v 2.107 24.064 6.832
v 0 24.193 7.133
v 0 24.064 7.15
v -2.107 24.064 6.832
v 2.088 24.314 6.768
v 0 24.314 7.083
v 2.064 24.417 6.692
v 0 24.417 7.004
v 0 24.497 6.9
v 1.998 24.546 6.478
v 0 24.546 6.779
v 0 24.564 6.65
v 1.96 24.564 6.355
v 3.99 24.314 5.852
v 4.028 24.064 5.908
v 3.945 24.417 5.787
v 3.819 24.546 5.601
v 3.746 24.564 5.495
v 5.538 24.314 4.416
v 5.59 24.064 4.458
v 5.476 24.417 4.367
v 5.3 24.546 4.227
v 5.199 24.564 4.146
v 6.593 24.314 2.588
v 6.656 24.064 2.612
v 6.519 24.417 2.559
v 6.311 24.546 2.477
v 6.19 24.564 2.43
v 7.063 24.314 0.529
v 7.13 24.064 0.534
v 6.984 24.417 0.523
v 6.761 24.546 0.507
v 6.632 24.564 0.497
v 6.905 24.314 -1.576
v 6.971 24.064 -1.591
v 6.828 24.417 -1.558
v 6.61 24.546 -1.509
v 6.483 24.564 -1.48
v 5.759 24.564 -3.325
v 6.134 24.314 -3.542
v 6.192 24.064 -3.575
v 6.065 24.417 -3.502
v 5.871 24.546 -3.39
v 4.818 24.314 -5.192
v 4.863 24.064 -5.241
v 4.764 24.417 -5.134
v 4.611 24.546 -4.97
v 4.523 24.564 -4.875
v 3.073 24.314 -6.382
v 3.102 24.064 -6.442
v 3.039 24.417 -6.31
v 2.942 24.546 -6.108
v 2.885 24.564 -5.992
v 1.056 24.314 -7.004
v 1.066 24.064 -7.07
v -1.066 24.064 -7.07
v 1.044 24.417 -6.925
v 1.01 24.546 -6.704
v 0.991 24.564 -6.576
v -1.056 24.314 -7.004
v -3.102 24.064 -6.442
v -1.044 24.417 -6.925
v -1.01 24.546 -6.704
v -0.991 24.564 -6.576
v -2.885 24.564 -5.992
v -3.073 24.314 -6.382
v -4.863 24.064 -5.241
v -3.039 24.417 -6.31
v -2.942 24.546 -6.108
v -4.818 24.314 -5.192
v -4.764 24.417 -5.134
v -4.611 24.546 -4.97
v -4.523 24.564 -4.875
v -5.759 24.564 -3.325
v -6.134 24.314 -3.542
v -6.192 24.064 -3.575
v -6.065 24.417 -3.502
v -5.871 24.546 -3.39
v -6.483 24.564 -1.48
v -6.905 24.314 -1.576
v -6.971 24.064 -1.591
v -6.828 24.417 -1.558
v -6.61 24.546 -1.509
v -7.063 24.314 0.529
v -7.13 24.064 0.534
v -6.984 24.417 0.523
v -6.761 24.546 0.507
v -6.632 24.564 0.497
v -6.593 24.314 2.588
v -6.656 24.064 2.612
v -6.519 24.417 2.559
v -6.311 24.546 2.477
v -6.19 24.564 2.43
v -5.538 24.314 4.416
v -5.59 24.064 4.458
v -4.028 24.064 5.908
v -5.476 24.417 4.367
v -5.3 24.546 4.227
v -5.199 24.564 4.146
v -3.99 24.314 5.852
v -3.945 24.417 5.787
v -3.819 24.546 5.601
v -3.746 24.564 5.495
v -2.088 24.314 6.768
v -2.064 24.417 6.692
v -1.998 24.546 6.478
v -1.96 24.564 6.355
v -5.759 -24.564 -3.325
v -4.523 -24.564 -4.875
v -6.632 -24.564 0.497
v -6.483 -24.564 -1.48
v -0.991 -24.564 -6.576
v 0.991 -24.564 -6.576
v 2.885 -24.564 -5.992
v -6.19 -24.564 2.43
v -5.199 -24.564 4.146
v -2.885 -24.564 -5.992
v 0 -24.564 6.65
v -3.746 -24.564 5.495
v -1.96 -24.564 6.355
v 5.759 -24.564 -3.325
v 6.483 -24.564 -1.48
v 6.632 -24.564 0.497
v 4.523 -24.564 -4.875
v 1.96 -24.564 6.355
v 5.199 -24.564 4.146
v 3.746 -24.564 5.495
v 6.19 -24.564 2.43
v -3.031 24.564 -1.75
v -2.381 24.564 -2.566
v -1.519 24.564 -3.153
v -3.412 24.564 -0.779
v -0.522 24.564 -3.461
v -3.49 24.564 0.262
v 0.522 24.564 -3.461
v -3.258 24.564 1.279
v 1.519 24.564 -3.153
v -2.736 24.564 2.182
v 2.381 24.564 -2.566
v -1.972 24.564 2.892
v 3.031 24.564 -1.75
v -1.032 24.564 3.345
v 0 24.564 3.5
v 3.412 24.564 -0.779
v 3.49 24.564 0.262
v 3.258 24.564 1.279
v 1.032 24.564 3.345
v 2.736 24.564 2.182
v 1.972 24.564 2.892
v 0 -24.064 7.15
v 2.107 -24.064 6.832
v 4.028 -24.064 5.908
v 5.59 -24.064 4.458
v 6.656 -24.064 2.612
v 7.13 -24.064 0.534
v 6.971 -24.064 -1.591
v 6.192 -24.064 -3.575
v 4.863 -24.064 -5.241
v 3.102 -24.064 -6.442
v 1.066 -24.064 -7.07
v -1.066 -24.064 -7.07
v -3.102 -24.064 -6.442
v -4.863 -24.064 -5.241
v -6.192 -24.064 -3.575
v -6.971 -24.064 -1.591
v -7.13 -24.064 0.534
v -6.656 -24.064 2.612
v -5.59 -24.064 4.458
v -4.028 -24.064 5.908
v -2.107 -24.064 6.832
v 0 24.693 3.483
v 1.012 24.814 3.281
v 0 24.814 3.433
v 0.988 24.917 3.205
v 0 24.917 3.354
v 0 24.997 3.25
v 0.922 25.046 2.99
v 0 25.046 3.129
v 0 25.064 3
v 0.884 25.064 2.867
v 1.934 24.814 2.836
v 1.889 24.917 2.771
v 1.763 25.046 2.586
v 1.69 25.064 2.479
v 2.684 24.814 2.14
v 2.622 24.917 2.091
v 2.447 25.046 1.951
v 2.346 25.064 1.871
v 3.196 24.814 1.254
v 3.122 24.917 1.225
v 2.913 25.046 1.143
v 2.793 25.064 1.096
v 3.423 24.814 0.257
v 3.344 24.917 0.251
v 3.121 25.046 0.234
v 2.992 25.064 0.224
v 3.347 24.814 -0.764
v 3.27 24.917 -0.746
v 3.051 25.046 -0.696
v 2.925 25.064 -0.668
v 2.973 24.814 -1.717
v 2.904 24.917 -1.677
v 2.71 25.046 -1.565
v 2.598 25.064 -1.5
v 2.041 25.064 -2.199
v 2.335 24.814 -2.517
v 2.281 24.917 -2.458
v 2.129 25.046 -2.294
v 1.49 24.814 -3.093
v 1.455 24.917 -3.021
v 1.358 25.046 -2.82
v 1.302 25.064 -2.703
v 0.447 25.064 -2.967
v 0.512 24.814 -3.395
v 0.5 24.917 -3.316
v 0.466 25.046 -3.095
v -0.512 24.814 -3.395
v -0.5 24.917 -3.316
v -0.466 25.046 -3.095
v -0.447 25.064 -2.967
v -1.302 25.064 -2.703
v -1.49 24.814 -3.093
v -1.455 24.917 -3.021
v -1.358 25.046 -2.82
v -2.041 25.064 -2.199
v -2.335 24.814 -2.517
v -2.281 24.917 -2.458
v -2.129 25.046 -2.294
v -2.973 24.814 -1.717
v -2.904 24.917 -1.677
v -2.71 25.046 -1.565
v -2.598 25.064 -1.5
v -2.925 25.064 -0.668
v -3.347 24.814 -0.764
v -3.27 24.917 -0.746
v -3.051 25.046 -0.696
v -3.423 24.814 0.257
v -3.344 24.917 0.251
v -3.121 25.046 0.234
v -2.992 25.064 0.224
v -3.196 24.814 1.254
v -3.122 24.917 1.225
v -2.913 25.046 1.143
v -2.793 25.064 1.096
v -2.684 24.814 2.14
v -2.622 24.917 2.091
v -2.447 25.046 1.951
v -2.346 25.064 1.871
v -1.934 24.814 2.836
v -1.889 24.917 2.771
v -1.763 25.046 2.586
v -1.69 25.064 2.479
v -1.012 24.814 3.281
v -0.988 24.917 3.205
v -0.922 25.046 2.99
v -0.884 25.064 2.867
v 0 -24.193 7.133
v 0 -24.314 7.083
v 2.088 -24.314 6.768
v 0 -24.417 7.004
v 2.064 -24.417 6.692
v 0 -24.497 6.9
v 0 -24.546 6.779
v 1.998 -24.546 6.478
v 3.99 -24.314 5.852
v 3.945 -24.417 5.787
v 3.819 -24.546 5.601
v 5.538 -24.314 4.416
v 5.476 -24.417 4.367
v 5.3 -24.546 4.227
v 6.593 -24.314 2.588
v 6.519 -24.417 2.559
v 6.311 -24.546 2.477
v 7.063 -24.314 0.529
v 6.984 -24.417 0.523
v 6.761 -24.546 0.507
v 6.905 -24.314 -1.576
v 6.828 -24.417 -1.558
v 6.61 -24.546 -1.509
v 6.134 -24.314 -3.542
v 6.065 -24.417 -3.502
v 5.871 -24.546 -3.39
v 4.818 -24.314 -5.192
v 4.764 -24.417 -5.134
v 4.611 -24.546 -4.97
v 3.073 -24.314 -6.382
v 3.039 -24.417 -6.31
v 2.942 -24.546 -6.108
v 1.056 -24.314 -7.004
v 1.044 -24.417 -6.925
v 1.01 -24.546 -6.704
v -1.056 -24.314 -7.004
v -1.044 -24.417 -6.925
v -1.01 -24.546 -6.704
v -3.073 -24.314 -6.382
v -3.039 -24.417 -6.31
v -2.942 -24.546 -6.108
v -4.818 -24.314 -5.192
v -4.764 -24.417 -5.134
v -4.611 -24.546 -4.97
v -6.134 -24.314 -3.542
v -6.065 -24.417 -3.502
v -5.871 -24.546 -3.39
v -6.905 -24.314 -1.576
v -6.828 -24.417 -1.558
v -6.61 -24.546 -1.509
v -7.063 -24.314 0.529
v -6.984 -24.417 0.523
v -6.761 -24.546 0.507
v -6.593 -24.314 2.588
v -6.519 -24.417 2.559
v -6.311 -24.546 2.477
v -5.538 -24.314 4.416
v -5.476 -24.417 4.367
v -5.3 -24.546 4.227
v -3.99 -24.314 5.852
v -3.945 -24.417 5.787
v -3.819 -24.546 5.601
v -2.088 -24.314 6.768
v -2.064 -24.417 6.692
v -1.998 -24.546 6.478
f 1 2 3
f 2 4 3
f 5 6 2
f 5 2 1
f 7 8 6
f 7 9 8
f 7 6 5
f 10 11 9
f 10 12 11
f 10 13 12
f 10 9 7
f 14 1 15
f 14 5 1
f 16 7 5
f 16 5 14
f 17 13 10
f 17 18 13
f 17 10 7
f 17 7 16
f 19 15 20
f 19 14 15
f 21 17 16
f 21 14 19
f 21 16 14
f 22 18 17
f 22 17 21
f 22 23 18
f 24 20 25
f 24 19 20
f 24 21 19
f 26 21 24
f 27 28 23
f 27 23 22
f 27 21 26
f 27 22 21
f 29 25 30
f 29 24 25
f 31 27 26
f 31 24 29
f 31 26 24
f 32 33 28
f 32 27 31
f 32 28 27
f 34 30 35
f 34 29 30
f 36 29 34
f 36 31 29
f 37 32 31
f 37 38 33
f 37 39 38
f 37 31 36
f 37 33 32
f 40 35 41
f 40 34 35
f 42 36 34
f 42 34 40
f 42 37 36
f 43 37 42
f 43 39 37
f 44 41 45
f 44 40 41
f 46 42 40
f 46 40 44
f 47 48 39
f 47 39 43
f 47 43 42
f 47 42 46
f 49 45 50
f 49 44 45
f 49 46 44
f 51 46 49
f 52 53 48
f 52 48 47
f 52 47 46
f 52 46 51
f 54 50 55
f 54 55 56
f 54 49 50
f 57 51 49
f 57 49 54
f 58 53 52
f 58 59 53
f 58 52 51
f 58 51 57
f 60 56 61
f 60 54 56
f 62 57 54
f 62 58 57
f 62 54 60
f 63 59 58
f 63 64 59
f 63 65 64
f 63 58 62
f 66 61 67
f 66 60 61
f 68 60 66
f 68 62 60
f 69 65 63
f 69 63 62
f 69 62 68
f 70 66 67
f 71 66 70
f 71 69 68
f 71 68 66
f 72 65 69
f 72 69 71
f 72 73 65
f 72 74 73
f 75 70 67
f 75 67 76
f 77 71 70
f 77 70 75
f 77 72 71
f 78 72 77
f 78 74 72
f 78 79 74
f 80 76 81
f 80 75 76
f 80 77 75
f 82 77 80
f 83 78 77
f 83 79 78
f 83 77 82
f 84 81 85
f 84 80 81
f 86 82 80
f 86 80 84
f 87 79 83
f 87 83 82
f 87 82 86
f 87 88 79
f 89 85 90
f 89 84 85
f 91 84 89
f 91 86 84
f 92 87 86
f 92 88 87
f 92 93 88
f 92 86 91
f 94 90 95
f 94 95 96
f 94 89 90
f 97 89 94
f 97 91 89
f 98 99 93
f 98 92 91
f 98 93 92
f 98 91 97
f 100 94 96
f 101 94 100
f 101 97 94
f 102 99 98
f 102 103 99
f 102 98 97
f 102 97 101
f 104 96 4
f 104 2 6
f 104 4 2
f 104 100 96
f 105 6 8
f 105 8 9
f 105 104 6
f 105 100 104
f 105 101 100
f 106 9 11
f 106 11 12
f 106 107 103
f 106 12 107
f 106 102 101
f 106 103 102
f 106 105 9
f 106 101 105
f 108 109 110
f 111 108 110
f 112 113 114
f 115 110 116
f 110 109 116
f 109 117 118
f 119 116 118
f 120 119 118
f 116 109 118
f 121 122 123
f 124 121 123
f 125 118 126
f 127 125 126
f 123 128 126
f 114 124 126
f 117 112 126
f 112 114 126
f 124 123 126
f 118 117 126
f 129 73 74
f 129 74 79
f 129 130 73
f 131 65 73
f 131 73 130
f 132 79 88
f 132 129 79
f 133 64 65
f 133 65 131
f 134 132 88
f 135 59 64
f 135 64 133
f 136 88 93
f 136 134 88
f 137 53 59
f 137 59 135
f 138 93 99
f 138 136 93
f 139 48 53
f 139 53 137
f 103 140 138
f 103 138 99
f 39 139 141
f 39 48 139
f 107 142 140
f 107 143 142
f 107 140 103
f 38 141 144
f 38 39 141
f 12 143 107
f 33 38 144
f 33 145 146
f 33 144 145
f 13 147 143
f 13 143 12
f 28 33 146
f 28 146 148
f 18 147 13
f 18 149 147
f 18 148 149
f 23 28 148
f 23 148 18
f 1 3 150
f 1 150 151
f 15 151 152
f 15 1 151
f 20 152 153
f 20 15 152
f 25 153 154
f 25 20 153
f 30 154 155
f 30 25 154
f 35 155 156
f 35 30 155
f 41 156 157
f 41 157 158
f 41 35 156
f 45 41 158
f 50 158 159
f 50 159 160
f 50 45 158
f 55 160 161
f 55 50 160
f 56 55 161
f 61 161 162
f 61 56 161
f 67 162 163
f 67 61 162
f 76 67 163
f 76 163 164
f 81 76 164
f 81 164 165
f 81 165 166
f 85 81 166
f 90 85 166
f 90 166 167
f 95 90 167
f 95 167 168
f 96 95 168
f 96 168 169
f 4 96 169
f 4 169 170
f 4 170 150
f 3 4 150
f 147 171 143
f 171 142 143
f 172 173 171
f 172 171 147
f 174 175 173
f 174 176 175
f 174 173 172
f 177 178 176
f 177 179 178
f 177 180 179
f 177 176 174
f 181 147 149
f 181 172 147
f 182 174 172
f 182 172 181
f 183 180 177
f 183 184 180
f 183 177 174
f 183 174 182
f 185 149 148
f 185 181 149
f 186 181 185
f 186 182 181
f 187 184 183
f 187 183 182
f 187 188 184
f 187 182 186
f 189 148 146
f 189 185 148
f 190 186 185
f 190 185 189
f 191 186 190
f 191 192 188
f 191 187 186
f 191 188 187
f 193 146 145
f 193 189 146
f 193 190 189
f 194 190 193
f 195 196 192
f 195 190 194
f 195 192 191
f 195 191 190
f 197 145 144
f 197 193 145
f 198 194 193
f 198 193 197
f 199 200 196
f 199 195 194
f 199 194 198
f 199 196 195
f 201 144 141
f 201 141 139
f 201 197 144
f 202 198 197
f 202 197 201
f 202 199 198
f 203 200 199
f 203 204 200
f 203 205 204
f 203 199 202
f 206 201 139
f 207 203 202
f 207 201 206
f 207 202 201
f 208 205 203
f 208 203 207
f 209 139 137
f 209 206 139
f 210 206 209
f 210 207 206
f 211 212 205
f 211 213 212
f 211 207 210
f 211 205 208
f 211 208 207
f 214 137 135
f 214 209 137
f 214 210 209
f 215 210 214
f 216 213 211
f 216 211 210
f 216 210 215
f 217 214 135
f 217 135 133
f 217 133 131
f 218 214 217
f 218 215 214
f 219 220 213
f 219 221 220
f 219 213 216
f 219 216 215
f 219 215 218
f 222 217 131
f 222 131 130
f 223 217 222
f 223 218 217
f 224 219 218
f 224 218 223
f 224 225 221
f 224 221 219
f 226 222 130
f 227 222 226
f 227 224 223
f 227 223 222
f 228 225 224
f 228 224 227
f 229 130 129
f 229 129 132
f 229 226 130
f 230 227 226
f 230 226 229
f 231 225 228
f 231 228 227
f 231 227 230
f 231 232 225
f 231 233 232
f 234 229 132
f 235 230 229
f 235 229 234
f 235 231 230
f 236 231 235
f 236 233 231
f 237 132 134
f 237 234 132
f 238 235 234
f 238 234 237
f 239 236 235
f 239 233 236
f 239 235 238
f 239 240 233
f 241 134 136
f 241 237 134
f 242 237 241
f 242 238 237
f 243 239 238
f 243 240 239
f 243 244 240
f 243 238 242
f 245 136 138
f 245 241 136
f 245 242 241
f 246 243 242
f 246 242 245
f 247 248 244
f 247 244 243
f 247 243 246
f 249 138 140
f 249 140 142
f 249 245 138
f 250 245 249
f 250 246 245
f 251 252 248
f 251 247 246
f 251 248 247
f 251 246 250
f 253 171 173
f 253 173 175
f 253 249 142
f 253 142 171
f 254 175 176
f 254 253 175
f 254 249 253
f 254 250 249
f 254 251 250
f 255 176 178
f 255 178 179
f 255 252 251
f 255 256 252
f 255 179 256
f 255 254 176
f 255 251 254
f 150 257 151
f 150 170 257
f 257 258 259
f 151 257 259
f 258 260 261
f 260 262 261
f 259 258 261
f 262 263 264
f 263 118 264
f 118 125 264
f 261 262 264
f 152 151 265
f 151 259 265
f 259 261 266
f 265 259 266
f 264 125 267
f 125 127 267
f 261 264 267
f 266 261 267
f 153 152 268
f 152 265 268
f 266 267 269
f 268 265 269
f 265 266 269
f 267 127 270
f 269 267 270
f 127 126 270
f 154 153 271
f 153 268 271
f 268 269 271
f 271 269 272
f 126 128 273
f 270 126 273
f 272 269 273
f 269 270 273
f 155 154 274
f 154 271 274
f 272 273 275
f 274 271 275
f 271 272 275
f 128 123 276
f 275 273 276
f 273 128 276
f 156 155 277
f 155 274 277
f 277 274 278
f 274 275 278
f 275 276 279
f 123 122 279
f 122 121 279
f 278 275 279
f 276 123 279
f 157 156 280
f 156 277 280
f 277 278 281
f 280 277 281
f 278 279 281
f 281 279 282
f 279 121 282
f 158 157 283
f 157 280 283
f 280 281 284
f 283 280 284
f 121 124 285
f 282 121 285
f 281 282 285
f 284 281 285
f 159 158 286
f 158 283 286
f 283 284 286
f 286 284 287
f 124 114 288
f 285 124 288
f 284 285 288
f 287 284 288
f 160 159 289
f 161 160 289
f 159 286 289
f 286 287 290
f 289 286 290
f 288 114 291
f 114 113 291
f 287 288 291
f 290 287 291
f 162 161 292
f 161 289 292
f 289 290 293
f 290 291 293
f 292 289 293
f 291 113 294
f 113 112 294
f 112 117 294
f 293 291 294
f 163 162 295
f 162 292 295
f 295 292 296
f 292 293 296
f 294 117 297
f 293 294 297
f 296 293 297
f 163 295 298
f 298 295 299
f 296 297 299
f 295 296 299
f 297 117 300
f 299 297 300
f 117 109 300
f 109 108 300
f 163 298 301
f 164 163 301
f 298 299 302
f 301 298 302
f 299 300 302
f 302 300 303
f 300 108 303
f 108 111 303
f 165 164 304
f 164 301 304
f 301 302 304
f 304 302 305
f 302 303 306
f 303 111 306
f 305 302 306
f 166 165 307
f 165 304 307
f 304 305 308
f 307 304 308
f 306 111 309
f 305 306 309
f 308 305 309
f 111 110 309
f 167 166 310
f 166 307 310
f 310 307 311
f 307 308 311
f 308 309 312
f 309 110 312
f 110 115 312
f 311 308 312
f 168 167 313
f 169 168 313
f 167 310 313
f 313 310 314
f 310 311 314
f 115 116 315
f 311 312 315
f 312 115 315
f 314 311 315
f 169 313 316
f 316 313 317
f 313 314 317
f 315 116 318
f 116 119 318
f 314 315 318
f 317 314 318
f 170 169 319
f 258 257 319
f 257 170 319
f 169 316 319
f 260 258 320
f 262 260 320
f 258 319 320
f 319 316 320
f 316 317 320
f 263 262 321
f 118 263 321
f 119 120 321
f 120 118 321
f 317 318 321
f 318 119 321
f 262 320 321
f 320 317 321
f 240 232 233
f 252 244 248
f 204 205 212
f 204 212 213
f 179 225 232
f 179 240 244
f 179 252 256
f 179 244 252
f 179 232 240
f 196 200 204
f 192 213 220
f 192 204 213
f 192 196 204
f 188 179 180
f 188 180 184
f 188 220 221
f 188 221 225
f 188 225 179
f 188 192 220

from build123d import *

# Parameters (mm, degrees)
SKETCH1_R           = 7.15
BOSS_EXTRUDE1_DEPTH = 24.5635
SKETCH2_R           = 3.5
BOSS_EXTRUDE2_DEPTH = 0.5
FILLET1_R           = 0.5


with BuildPart() as part:
    # Sketch1 → Boss-Extrude1 (new, symmetric)
    with BuildSketch(Plane(origin=(0, 0, 0), x_dir=(1, 0, 0), z_dir=(0, 1, 0))):
        with Locations(Location((0, 0, 0), (0, 0, 270))):
            Circle(SKETCH1_R)
    extrude(amount=BOSS_EXTRUDE1_DEPTH, both=True)

    # Sketch2 → Boss-Extrude2 (add)
    with BuildSketch(Plane(origin=(0, 24.5635, 0), x_dir=(1, 0, 0), z_dir=(0, 1, 0))):
        with Locations(Location((0, 0, 0), (0, 0, 270))):
            Circle(SKETCH2_R)
    extrude(amount=BOSS_EXTRUDE2_DEPTH)

    # Fillet1
    fillet1_edges = [part.edges().sort_by_distance(p)[0] for p in [
        (0, -24.5635, -7.15),
        (0, 24.5635, -7.15),
        (0, 25.0635, -3.5),
    ]]
    fillet(fillet1_edges, radius=FILLET1_R - 0.0001)  # a hair under: the kernel refuses the full size


solid = part.part
